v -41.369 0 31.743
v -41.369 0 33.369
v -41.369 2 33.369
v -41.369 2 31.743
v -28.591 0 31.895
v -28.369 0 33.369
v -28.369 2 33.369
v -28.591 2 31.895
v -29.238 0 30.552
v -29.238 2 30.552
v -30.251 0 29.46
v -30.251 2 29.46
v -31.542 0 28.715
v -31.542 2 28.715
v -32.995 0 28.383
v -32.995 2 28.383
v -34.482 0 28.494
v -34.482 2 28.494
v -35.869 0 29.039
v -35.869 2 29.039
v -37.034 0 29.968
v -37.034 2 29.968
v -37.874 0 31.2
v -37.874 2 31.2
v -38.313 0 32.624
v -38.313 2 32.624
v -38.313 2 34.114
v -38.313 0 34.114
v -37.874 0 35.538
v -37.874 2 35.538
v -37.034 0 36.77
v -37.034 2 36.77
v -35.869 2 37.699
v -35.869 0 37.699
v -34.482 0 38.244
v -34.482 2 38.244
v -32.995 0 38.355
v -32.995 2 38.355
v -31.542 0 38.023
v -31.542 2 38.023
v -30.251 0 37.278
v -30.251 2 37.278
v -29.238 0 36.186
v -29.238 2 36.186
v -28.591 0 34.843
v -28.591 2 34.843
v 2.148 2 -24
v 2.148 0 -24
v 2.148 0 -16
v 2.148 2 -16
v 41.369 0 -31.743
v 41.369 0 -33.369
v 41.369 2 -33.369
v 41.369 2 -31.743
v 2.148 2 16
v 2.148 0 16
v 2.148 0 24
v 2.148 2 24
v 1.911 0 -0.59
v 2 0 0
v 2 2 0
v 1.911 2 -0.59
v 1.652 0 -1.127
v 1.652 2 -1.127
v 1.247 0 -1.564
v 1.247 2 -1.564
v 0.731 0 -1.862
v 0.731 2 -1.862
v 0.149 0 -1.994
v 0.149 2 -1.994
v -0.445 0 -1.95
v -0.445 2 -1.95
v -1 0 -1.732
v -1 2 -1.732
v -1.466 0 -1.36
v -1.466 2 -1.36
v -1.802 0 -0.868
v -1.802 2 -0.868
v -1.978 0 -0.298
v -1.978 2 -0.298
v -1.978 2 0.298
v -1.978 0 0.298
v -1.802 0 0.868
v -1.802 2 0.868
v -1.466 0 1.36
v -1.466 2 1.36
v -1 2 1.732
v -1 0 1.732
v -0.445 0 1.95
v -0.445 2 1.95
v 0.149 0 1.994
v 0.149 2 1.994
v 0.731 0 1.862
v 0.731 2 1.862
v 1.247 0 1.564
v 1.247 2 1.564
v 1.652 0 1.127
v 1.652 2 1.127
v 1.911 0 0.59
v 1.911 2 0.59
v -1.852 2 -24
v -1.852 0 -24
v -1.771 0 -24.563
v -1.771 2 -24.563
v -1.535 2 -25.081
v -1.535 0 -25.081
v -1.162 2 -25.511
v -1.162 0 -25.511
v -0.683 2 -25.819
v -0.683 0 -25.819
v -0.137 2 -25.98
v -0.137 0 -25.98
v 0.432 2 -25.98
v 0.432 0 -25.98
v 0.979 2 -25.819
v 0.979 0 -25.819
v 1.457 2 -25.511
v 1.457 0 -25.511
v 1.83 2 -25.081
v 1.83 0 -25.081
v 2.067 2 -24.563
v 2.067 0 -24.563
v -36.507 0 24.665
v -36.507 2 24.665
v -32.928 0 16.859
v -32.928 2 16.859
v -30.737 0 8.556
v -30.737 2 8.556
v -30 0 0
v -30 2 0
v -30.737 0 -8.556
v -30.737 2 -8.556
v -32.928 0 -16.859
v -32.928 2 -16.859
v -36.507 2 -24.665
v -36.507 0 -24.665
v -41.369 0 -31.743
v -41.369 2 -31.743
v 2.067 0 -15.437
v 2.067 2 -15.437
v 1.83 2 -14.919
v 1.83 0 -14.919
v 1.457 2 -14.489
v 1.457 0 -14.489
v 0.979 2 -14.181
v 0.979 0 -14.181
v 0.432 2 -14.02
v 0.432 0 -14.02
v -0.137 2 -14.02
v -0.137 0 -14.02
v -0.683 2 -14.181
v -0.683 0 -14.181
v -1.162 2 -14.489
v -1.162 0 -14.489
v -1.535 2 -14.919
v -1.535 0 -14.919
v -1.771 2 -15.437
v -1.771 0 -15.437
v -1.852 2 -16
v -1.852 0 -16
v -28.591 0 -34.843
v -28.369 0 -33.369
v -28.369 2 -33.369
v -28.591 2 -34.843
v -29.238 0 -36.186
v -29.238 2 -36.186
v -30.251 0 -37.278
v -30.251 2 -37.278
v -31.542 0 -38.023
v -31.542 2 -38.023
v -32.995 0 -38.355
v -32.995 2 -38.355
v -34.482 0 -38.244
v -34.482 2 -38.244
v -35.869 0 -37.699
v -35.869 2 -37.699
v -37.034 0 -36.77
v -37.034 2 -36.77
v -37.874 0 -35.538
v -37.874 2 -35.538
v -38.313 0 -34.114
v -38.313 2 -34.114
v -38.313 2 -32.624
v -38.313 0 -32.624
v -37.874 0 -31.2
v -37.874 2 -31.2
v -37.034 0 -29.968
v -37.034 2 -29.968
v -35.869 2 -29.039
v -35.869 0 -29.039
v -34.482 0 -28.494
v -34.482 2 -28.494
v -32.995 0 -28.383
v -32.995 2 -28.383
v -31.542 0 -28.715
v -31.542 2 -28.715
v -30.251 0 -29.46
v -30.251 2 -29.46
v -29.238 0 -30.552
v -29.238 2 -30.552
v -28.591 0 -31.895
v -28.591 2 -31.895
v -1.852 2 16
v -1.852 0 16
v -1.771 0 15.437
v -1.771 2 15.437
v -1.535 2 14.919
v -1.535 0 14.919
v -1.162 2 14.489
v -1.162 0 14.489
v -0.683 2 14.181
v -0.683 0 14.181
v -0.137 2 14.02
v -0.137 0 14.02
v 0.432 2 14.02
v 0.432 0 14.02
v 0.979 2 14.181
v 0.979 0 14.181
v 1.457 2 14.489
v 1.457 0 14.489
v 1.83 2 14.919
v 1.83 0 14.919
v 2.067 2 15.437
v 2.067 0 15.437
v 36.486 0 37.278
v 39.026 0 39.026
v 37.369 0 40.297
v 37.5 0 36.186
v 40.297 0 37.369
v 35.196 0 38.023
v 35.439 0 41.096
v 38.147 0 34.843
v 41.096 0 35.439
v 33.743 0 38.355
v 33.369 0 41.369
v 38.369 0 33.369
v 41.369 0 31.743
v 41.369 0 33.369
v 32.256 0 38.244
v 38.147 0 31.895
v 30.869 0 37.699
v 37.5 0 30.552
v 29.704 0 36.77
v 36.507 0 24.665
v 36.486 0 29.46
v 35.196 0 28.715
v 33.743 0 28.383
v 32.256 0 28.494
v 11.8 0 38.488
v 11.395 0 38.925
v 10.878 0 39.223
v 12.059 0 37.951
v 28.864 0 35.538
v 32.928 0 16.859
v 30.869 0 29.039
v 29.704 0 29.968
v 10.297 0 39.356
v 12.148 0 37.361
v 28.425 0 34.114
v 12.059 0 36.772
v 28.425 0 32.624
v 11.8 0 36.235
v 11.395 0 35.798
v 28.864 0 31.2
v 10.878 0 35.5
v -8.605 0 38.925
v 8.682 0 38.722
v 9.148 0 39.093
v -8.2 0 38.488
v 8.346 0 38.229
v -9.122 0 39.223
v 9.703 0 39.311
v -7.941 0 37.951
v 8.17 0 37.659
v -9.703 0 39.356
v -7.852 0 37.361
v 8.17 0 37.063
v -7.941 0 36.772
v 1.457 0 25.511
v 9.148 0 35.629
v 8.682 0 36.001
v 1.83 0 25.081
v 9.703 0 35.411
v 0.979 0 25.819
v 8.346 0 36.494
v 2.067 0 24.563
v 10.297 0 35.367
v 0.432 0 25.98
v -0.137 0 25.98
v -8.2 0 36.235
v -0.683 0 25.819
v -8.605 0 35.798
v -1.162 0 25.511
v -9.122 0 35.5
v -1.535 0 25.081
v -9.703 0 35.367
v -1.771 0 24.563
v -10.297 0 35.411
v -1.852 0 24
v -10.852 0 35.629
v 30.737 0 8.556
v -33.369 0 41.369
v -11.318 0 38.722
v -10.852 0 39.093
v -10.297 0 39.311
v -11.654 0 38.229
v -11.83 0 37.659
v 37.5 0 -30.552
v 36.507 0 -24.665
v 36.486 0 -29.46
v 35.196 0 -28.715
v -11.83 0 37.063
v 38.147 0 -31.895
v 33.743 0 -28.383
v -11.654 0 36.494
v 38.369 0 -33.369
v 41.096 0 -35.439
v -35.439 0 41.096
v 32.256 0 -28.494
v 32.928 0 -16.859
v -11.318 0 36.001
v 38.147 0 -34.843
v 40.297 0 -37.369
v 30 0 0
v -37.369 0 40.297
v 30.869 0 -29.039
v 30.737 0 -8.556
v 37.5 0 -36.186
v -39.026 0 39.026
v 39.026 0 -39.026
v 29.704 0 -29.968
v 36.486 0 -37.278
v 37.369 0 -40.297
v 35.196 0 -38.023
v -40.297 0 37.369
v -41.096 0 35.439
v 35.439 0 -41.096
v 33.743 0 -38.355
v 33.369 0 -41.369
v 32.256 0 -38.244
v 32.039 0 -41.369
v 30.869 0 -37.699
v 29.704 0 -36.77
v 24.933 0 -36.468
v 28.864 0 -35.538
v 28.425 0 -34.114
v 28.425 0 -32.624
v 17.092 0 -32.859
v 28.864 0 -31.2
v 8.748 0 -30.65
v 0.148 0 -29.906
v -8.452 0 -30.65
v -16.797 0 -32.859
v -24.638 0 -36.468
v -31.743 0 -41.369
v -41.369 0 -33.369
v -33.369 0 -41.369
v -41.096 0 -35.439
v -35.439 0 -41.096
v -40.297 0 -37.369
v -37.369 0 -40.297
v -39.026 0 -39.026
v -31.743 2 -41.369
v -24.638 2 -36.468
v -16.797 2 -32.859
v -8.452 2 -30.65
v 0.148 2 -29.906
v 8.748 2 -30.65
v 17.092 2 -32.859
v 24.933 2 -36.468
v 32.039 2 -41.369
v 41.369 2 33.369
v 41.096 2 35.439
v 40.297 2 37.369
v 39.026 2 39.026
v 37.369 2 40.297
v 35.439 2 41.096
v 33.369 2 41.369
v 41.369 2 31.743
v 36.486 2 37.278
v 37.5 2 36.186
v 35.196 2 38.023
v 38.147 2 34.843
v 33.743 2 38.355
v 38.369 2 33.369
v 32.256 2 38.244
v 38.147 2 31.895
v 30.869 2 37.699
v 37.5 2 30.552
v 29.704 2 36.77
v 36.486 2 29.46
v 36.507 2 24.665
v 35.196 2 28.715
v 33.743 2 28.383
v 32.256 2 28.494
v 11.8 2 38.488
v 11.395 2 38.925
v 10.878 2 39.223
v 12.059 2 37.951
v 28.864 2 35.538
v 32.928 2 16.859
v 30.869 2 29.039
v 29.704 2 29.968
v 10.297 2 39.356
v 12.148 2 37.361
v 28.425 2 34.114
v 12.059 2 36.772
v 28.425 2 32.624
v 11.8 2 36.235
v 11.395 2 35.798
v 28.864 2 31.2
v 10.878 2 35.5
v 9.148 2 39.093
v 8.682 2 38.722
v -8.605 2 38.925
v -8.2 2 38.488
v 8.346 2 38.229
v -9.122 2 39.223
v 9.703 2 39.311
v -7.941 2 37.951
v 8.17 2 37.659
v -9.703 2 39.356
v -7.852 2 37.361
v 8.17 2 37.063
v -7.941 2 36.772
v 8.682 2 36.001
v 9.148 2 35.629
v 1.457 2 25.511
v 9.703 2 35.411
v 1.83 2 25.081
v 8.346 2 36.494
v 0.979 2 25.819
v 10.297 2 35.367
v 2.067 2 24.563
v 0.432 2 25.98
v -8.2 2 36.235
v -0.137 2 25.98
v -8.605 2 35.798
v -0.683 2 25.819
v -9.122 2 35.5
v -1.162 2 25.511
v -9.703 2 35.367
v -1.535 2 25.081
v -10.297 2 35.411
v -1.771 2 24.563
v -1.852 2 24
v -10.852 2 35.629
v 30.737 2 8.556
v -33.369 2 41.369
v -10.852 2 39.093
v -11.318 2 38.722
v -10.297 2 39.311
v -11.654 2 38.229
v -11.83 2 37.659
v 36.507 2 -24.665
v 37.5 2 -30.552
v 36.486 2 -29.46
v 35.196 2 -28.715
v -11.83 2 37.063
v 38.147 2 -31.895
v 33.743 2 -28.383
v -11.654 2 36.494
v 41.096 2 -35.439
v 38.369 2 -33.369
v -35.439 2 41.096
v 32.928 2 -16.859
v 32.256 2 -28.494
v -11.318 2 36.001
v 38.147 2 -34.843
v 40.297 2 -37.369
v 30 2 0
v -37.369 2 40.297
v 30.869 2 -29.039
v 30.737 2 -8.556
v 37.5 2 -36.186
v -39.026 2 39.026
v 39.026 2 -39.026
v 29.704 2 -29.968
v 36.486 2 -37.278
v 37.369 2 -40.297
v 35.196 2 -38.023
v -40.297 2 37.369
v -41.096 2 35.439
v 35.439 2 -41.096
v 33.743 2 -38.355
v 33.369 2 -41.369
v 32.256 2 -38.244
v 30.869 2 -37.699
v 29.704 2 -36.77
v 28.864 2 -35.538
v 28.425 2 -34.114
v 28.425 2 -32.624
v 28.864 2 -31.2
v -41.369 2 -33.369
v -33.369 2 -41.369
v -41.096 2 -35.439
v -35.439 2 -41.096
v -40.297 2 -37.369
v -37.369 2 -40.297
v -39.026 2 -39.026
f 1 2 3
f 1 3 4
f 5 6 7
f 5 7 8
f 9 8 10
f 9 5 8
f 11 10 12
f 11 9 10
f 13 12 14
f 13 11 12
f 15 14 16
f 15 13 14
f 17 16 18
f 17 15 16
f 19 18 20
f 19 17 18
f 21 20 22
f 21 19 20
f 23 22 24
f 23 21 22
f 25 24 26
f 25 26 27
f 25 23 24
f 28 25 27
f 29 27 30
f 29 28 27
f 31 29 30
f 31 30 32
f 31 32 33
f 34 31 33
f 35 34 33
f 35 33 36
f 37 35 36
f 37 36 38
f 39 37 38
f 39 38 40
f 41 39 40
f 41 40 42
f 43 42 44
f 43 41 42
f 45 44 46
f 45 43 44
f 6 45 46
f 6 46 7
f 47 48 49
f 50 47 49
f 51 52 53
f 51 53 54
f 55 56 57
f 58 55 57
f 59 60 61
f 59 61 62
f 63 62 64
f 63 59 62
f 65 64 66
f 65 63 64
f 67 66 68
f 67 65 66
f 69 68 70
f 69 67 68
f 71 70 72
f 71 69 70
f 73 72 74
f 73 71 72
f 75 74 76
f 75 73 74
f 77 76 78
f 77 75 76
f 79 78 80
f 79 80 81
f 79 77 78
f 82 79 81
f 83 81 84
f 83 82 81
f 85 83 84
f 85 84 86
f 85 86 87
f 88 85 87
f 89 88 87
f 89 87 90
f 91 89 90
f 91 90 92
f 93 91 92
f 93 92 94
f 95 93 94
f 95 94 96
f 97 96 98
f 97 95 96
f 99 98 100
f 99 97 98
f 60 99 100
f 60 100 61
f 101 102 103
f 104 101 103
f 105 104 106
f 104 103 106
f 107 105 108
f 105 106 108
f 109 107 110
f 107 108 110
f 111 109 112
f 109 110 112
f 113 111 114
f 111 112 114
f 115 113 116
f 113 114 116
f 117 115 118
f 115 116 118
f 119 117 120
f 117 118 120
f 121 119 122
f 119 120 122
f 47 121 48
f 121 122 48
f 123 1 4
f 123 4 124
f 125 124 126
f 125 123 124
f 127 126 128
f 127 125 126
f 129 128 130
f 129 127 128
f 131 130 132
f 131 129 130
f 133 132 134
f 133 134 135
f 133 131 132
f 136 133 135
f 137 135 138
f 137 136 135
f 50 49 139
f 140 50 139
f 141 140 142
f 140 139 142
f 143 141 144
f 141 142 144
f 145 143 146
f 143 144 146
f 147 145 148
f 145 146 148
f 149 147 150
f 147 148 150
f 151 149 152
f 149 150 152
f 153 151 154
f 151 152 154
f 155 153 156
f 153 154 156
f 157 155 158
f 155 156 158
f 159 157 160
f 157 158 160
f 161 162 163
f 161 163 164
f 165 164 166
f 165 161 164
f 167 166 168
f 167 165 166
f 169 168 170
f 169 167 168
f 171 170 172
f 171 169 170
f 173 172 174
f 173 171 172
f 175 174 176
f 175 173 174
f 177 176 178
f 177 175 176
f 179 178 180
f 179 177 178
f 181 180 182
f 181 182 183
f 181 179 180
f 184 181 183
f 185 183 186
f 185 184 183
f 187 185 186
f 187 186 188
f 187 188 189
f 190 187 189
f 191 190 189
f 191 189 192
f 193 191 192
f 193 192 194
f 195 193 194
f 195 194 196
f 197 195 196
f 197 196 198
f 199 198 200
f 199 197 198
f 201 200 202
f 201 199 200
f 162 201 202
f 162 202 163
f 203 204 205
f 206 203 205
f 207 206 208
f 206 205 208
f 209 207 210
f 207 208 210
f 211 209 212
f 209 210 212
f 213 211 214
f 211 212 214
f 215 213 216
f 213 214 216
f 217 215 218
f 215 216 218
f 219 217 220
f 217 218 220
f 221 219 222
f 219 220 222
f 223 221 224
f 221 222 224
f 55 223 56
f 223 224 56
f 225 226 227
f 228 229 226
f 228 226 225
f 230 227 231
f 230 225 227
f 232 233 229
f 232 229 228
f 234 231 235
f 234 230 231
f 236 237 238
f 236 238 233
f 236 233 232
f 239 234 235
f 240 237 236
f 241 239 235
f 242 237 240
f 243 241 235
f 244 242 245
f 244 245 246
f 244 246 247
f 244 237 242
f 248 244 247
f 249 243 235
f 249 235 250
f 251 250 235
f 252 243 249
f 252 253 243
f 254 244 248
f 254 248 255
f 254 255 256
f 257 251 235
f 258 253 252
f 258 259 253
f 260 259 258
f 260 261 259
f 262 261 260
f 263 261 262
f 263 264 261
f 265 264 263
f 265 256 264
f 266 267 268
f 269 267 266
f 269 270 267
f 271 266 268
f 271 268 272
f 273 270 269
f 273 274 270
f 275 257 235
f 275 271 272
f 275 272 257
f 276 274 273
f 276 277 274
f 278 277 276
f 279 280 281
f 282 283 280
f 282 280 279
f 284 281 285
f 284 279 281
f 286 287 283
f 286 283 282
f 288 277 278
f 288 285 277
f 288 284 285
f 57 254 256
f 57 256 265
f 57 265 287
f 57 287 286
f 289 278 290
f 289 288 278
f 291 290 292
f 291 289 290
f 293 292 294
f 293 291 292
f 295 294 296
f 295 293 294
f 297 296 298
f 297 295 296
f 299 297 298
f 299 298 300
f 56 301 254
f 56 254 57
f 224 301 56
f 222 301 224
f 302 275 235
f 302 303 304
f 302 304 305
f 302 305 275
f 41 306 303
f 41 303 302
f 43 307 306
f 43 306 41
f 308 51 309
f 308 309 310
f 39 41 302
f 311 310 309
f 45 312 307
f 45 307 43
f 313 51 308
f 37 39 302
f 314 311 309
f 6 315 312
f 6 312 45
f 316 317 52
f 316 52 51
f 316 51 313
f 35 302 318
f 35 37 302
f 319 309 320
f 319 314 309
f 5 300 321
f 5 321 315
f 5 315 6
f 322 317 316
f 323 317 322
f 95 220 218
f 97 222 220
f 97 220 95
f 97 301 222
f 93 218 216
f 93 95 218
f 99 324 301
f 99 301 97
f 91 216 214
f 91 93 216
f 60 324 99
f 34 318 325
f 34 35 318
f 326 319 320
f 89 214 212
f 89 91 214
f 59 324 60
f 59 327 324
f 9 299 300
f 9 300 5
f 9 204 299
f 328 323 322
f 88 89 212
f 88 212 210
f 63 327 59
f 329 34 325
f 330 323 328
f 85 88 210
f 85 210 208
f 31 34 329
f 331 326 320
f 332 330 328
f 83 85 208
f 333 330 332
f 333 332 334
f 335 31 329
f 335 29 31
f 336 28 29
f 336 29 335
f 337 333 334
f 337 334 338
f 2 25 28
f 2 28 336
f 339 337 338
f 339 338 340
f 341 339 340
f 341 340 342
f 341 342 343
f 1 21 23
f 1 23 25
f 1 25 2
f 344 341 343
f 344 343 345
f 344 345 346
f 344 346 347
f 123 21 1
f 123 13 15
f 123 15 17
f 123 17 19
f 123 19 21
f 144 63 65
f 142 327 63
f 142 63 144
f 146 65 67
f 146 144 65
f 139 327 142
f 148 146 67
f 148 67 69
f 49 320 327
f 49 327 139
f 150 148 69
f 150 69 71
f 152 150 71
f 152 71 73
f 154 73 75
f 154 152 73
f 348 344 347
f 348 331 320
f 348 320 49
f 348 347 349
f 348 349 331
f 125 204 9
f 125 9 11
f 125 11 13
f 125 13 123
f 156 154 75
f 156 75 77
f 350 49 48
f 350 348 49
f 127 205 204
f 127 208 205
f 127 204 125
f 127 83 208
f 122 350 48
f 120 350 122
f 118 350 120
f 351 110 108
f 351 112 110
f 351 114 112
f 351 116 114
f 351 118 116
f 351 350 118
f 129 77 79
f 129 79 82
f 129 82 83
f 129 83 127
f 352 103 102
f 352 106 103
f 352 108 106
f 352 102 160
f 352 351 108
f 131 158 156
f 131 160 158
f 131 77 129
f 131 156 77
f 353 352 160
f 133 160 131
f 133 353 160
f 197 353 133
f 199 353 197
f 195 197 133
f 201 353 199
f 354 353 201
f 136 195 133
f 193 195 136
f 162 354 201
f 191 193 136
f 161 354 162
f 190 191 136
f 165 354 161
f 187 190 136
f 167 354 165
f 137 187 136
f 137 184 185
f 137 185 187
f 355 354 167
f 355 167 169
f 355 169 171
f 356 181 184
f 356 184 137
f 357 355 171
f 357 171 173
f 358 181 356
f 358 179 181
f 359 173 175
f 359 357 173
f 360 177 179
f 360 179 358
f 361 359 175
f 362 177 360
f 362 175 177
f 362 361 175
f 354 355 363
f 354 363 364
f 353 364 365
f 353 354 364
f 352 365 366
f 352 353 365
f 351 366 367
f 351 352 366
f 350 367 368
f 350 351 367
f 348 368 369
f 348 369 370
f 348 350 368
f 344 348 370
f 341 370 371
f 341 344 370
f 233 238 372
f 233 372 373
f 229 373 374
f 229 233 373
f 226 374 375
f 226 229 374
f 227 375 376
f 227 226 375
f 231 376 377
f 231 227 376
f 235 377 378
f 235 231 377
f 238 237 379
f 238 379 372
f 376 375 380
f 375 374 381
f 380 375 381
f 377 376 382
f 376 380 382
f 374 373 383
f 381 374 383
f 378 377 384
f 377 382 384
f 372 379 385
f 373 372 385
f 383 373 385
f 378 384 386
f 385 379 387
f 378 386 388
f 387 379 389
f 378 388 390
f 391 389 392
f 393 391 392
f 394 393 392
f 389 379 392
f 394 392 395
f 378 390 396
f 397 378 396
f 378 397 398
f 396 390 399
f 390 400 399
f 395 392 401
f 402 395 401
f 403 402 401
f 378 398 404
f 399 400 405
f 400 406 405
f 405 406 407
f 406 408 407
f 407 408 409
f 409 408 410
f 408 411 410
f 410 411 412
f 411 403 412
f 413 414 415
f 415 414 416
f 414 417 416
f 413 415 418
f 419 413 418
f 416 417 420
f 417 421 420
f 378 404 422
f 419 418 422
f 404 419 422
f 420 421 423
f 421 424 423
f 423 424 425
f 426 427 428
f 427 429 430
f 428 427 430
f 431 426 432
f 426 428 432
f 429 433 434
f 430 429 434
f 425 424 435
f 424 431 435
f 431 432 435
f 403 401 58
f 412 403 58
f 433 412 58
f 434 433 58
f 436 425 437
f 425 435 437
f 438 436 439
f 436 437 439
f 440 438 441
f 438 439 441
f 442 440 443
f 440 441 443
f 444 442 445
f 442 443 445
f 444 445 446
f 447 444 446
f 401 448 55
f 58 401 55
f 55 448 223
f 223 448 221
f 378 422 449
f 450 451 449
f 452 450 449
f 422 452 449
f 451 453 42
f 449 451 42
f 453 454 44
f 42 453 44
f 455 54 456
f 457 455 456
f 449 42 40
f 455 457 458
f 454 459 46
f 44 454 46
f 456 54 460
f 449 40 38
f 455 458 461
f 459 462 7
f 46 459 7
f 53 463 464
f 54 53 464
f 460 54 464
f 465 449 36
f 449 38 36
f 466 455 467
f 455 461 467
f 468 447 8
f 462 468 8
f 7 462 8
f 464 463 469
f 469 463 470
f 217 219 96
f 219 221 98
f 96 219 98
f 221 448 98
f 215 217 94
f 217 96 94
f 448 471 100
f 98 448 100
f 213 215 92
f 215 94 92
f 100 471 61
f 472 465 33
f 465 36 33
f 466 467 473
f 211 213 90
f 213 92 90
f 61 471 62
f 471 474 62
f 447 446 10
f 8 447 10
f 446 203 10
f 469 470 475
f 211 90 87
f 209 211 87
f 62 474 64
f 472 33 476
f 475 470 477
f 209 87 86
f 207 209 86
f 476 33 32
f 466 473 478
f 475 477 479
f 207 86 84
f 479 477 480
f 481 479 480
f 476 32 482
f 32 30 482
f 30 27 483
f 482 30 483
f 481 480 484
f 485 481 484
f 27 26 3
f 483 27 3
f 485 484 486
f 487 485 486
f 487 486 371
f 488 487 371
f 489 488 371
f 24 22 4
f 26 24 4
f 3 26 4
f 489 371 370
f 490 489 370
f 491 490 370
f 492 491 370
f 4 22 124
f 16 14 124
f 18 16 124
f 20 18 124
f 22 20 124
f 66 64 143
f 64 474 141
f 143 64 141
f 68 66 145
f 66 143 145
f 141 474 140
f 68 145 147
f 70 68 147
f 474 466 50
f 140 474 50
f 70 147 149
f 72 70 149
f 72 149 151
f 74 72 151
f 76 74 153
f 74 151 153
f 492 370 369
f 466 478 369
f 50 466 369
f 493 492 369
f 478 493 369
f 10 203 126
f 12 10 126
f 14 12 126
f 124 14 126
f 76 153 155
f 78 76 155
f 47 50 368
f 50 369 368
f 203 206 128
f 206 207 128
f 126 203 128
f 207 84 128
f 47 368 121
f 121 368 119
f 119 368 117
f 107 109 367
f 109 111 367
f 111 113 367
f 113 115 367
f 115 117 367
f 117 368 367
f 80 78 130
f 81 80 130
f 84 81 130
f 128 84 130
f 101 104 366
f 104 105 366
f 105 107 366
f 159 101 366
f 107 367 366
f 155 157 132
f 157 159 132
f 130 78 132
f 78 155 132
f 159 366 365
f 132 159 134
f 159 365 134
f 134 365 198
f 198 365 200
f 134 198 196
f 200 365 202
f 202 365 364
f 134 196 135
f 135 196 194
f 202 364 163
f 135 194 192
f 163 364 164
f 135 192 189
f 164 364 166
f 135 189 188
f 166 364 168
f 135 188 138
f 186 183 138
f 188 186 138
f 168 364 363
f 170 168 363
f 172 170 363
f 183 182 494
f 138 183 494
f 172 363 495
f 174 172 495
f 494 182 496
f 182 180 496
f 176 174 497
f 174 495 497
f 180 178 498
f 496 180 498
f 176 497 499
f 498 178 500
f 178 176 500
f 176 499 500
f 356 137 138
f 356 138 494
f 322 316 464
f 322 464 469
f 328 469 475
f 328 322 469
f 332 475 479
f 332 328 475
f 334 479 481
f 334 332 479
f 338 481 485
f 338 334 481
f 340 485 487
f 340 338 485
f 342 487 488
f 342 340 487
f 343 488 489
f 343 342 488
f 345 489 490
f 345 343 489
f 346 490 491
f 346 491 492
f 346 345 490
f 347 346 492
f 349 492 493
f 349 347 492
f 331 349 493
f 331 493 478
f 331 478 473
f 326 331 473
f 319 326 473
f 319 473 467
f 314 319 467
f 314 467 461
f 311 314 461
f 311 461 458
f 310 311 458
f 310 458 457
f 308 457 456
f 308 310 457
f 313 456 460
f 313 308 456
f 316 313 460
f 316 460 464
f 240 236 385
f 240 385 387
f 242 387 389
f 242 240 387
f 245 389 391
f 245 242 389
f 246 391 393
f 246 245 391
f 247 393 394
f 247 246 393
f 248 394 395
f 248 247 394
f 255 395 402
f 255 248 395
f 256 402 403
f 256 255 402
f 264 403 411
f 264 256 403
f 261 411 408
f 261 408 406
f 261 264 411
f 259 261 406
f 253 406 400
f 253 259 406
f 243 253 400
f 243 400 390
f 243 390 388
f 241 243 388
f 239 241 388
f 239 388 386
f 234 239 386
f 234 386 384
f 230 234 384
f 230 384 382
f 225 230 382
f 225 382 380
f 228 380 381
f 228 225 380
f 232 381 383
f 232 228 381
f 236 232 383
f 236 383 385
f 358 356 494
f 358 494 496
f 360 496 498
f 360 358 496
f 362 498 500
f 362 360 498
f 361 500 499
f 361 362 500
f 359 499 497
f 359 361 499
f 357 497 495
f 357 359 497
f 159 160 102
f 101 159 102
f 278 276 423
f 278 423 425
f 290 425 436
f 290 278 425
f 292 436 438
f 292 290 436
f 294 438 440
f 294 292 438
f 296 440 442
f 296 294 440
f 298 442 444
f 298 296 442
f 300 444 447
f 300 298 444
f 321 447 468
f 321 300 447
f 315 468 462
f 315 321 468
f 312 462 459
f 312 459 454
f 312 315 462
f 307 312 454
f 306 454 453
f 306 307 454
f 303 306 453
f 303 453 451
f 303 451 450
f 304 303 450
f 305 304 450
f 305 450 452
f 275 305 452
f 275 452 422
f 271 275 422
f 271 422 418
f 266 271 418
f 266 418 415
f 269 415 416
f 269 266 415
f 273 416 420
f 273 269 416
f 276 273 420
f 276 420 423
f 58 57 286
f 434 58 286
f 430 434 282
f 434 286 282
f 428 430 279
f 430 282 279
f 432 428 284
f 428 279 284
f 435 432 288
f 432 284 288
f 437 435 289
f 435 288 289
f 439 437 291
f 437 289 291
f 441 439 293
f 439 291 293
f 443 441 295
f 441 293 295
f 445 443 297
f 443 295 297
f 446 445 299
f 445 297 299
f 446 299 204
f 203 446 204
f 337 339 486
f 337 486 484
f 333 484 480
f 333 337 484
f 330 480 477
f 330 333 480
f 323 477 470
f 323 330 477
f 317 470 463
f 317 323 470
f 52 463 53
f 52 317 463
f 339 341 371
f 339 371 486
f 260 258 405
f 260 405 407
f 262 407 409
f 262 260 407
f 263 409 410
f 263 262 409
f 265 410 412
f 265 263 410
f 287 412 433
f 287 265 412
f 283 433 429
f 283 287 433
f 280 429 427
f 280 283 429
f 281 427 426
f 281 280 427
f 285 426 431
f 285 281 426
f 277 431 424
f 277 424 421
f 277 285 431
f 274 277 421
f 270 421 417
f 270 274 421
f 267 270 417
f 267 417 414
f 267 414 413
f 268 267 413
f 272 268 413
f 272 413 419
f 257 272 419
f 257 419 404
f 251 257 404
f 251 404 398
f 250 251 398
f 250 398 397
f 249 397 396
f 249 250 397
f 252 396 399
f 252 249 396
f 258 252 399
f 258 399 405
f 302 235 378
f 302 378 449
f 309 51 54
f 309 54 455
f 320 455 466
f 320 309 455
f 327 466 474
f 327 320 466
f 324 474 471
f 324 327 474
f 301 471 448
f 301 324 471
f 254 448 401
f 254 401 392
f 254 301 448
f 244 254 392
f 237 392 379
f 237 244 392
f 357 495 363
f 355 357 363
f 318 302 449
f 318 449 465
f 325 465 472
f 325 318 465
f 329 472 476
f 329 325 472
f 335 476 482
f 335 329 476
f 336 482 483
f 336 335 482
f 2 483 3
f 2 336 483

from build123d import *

# Parameters (mm, degrees)
SKETCH1_R           = 5
SKETCH1_R_2         = 2
BOSS_EXTRUDE1_DEPTH = 2


with BuildPart() as part:
    # Sketch1 → Boss-Extrude1 (new body)
    with BuildSketch(Plane(origin=(0, 0, 0), x_dir=(1, 0, 0), z_dir=(0, 1, 0))):
        with BuildLine():
            Line((32.038903515, 41.368938053), (33.368938053, 41.368938053))
            ThreePointArc((33.368938053, 41.368938053), (39.025792302, 39.025792302), (41.368938053, 33.368938053))
            Line((41.368938053, 33.368938053), (41.368938053, 31.743362343))
            ThreePointArc((41.368938053, 31.743362343), (30, 0), (41.368938053, -31.743362343))
            Line((41.368938053, -31.743362343), (41.368938053, -33.368938053))
            ThreePointArc((41.368938053, -33.368938053), (39.025792302, -39.025792302), (33.368938053, -41.368938053))
            Line((33.368938053, -41.368938053), (32.038903515, -41.368938053))
            Line((32.038903515, -41.368938053), (-31.743362343, -41.368938053))
            Line((-31.743362343, -41.368938053), (-33.368938053, -41.368938053))
            ThreePointArc((-33.368938053, -41.368938053), (-39.025792302, -39.025792302), (-41.368938053, -33.368938053))
            Line((-41.368938053, -33.368938053), (-41.368938053, -31.743362343))
            ThreePointArc((-41.368938053, -31.743362343), (-30, 0), (-41.368938053, 31.743362343))
            Line((-41.368938053, 31.743362343), (-41.368938053, 33.368938053))
            ThreePointArc((-41.368938053, 33.368938053), (-39.025792302, 39.025792302), (-33.368938053, 41.368938053))
            Line((-33.368938053, 41.368938053), (-31.743362343, 41.368938053))
            ThreePointArc((-31.743362343, 41.368938053), (0.147770586, 29.90602396), (32.038903515, 41.368938053))
        make_face()
        with Locations((-33.368938053, 33.368938053)):
            Circle(SKETCH1_R, mode=Mode.SUBTRACT)
        with Locations((33.368938053, 33.368938053)):
            Circle(SKETCH1_R, mode=Mode.SUBTRACT)
        with Locations((-33.368938053, -33.368938053)):
            Circle(SKETCH1_R, mode=Mode.SUBTRACT)
        with Locations((33.368938053, -33.368938053)):
            Circle(SKETCH1_R, mode=Mode.SUBTRACT)
        Circle(SKETCH1_R_2, mode=Mode.SUBTRACT)
        with Locations((10.147770586, -37.36127525)):
            Circle(SKETCH1_R_2, mode=Mode.SUBTRACT)
        with Locations((-9.852229414, -37.36127525)):
            Circle(SKETCH1_R_2, mode=Mode.SUBTRACT)
        with BuildLine():
            Line((2.147770586, 24), (2.147770586, 16))
            ThreePointArc((2.147770586, 16), (0.147770586, 14), (-1.852229414, 16))
            Line((-1.852229414, 16), (-1.852229414, 24))
            ThreePointArc((-1.852229414, 24), (0.147770586, 26), (2.147770586, 24))
        make_face(mode=Mode.SUBTRACT)
        with BuildLine():
            Line((-1.852229414, -24), (-1.852229414, -16))
            ThreePointArc((-1.852229414, -16), (0.147770586, -14), (2.147770586, -16))
            Line((2.147770586, -16), (2.147770586, -24))
            ThreePointArc((2.147770586, -24), (0.147770586, -26), (-1.852229414, -24))
        make_face(mode=Mode.SUBTRACT)
    extrude(amount=BOSS_EXTRUDE1_DEPTH)


solid = part.part
